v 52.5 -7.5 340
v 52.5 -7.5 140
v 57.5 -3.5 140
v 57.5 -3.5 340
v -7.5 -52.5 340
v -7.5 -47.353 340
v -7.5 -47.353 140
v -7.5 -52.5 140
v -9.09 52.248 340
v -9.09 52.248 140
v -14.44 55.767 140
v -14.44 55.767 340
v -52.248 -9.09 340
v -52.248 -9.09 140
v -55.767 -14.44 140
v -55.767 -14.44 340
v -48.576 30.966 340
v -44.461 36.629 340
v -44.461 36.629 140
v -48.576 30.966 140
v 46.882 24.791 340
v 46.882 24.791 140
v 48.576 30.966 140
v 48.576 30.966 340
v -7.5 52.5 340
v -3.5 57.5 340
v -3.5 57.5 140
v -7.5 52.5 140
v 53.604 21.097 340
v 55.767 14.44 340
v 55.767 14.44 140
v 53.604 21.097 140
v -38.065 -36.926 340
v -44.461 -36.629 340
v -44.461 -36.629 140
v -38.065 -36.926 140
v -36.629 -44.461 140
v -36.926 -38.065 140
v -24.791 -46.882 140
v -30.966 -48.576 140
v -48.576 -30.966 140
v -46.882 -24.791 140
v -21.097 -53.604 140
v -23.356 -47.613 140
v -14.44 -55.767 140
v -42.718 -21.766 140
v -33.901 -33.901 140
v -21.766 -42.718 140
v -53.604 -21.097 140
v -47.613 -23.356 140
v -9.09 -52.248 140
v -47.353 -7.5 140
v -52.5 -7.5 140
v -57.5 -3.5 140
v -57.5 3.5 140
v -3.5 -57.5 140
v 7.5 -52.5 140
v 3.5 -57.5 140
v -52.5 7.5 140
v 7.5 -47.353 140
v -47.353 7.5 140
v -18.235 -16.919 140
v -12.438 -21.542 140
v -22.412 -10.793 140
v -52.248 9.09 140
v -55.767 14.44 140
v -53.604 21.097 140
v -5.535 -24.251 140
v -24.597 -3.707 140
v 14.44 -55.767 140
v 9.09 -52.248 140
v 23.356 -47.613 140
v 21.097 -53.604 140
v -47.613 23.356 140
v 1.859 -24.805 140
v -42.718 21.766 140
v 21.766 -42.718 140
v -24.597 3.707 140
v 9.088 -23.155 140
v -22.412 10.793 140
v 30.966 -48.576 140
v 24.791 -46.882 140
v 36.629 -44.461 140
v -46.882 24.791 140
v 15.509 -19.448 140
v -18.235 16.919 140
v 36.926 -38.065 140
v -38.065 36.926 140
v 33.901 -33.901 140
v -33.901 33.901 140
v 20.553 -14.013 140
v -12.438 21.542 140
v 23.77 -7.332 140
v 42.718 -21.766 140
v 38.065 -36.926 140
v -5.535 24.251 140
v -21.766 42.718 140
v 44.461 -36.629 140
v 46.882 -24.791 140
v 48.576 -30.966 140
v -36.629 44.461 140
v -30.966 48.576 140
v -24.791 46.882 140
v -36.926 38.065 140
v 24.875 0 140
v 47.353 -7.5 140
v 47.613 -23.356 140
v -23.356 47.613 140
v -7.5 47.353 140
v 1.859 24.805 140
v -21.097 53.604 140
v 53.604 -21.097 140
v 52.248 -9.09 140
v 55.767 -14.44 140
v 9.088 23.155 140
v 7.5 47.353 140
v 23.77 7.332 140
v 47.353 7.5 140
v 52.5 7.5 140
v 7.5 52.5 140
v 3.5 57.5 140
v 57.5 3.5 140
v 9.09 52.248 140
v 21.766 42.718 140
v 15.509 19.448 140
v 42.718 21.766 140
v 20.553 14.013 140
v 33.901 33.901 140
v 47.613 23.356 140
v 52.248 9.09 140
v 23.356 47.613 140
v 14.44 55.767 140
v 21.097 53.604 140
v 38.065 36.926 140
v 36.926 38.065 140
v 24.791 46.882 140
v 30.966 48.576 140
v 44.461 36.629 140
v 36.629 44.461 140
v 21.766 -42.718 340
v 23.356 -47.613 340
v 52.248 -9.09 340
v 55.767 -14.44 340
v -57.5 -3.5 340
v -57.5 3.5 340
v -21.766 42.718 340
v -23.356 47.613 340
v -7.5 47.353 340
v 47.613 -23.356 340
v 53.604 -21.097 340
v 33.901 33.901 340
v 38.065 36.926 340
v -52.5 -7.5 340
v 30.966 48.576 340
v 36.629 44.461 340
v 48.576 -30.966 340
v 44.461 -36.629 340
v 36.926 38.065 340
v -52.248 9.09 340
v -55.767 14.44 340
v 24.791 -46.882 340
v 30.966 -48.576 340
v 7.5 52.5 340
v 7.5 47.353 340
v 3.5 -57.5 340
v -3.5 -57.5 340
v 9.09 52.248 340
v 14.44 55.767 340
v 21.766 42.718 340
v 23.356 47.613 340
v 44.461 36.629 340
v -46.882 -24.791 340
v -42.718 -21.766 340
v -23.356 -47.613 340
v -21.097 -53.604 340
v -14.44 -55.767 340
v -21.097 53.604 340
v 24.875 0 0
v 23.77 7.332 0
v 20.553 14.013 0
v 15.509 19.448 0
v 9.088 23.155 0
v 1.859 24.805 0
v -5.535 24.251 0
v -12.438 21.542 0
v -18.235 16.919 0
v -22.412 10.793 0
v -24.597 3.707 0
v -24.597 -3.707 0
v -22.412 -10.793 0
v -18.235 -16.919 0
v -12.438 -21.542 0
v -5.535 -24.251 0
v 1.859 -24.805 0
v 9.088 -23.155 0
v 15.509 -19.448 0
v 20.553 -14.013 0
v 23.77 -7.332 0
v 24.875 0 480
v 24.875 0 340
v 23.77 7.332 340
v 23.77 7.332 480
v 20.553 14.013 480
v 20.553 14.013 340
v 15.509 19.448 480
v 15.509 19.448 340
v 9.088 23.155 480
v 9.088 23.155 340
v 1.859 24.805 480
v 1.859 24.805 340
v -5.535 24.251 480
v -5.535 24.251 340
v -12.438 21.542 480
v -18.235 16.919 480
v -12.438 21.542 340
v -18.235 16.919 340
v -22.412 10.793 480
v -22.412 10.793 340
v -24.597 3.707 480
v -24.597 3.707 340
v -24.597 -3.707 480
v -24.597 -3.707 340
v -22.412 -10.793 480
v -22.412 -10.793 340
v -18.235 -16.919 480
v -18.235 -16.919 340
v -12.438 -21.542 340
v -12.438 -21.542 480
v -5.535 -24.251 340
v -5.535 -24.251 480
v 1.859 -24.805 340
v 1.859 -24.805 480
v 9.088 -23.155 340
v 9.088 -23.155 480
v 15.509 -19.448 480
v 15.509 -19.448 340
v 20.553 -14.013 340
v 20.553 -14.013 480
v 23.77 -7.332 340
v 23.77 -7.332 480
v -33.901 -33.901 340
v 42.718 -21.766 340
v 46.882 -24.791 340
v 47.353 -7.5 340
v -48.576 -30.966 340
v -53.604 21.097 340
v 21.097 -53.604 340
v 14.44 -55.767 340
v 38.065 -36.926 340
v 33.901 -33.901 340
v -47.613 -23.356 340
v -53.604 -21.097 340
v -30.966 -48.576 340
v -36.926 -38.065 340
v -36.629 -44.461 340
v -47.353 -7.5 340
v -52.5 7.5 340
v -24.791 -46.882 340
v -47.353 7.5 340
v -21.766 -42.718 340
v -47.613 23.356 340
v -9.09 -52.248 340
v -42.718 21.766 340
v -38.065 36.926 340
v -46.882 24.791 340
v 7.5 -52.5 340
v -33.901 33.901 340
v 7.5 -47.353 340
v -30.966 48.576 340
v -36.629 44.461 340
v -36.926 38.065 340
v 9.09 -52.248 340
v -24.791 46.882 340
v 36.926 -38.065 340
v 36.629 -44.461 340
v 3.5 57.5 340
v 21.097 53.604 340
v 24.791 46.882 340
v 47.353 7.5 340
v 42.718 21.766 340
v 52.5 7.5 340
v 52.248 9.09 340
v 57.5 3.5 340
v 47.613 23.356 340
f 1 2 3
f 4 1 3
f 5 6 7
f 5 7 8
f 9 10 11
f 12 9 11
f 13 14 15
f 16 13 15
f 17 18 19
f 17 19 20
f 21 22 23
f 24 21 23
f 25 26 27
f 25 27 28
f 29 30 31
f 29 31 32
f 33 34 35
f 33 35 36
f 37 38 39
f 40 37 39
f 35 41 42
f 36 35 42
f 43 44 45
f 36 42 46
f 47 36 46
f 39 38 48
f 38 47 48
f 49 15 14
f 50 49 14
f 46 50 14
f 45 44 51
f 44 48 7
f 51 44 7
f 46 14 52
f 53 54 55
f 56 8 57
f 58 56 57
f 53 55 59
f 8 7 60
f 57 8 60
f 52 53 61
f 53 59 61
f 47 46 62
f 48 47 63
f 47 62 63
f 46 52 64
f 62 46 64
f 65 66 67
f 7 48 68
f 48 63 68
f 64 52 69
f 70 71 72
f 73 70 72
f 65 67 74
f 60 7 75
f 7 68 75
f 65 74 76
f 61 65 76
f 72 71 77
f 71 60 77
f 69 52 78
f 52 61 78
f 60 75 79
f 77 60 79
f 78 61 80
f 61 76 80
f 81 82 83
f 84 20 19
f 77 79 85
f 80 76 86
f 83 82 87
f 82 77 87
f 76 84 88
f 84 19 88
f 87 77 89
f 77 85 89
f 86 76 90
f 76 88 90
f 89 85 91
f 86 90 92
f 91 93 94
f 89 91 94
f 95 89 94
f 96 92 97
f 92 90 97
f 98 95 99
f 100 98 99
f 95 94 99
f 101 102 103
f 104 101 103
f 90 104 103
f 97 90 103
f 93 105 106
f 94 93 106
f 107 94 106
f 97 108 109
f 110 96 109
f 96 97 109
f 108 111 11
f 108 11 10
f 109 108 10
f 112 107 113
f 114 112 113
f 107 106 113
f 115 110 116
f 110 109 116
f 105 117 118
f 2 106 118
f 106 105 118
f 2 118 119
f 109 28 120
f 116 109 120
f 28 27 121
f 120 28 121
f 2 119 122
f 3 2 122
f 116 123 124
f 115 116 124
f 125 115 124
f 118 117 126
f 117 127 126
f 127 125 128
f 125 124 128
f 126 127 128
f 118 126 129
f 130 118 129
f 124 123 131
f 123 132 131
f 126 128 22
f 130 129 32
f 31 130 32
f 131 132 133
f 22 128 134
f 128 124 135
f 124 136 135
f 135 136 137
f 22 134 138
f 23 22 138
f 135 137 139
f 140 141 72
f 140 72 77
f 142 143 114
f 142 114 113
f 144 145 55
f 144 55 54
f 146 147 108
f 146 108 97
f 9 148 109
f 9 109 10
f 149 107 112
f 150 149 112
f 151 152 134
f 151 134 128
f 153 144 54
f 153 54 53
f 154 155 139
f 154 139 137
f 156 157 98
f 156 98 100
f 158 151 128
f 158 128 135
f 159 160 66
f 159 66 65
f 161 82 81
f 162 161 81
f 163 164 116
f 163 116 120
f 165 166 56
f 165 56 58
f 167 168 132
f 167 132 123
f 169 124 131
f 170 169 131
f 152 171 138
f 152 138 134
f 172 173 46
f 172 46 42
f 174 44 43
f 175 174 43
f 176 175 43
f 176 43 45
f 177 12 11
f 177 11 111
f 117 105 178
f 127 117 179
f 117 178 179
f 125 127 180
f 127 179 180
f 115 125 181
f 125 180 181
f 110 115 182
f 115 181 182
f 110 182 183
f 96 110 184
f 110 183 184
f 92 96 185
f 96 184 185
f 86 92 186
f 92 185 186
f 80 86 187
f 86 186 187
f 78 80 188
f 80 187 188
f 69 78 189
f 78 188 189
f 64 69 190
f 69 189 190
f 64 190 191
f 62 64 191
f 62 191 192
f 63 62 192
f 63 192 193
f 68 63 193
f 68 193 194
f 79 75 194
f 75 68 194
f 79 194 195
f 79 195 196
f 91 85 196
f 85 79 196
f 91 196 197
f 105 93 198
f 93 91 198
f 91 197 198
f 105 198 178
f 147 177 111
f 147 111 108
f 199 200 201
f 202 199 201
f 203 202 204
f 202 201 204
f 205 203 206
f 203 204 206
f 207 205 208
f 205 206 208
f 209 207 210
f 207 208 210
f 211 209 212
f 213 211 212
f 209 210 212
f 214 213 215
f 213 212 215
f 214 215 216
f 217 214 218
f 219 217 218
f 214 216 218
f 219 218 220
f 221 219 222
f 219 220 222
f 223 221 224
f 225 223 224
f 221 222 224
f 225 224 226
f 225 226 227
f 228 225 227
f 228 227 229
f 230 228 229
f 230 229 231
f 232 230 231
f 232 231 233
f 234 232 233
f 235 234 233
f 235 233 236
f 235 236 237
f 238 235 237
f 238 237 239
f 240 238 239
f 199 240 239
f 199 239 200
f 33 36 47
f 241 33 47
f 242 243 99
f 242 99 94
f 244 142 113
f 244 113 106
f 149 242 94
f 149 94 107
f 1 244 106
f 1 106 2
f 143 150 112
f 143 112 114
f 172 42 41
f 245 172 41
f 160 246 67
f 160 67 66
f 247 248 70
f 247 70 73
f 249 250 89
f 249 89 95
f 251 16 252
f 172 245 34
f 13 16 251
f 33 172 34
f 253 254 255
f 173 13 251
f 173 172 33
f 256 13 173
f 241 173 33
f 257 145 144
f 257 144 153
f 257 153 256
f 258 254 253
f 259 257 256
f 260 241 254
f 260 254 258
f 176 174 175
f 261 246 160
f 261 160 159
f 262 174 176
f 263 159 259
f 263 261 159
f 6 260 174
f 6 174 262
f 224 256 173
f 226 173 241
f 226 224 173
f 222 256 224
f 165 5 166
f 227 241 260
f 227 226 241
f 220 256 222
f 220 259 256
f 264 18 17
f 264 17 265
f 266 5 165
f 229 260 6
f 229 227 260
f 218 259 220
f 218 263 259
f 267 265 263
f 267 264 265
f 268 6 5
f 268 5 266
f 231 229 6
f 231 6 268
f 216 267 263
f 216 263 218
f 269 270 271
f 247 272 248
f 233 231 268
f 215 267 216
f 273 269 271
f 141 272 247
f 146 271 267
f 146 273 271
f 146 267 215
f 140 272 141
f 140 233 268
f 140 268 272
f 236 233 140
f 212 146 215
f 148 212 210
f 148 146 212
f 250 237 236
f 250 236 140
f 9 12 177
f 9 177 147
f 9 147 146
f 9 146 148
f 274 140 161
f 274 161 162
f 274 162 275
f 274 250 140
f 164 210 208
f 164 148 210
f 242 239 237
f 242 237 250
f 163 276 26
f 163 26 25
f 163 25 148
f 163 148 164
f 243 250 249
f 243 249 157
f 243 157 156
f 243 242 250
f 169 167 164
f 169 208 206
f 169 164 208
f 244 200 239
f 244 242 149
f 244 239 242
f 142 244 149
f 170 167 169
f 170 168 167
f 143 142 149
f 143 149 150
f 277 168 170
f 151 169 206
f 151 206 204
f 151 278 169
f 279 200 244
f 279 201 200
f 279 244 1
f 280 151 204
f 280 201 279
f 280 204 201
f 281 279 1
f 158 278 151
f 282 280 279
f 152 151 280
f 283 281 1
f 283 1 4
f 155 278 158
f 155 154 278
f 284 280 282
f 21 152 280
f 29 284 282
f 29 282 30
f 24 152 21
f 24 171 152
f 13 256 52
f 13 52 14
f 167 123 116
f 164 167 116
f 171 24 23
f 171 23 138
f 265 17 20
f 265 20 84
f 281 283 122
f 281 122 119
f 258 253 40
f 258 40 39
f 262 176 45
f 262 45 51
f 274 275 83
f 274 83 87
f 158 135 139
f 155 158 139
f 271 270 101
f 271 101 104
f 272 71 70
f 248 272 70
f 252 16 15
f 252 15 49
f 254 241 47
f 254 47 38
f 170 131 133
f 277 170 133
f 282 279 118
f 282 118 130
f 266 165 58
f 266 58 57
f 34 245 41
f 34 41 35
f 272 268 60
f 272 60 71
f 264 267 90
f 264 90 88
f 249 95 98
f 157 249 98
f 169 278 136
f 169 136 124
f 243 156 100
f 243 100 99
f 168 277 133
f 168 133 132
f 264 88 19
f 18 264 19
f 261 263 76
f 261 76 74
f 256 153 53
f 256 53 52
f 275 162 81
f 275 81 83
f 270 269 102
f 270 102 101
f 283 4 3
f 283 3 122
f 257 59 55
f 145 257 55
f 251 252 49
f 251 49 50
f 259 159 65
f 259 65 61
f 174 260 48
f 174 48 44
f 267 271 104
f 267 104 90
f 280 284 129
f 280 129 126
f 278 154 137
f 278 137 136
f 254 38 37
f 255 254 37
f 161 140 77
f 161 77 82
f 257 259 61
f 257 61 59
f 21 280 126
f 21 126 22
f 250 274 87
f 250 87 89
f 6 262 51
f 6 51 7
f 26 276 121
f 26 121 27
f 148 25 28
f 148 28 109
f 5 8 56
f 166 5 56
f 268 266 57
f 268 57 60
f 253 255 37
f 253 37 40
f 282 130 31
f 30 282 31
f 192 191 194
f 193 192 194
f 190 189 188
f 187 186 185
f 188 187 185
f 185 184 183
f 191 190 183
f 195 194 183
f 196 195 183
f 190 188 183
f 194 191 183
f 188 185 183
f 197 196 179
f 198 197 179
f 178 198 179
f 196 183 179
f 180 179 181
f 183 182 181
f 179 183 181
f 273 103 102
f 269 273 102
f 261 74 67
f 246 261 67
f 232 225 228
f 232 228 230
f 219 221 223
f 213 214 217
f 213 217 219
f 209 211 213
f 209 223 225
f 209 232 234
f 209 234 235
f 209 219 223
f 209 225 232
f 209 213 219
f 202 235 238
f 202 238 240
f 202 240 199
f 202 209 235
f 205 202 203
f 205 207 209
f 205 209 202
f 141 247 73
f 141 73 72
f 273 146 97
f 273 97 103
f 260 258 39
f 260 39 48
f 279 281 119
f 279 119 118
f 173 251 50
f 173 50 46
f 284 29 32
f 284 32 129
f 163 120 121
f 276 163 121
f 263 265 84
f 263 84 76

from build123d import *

# Parameters (mm, degrees)
SKETCH1_R           = 24.875
BOSS_EXTRUDE1_DEPTH = 480
SKETCH4_R           = 47.5
BOSS_EXTRUDE2_DEPTH = 100
BOSS_EXTRUDE3_DEPTH = 200
CIRPATTERN1_COUNT   = 20


with BuildPart() as part:
    # Sketch1 → Boss-Extrude1 (new body)
    with BuildSketch(Plane.XY):
        Circle(SKETCH1_R)
    extrude(amount=BOSS_EXTRUDE1_DEPTH)

    # Sketch4 → Boss-Extrude2 (add, symmetric)
    with BuildSketch(Plane.XY.offset(240)):
        Circle(SKETCH4_R)
    extrude(amount=BOSS_EXTRUDE2_DEPTH, both=True)

    # Sketch5 → Boss-Extrude3 (add)
    with BuildSketch(Plane.XY.offset(340)):
        with BuildLine():
            ThreePointArc((7.5, 46.904157598), (0, 47.5), (-7.5, 46.904157598))
            Line((-7.5, 46.904157598), (-7.5, 37.5))
            Line((-7.5, 37.5), (7.5, 37.5))
            Line((7.5, 37.5), (7.5, 46.904157598))
        make_face()
        with BuildLine():
            Line((-7.5, 37.5), (-7.5, 46.904157598))
            ThreePointArc((-7.5, 46.904157598), (-30.822070015, -36.142080737), (47.5, 0))
            ThreePointArc((47.5, 0), (36.142080737, 30.822070015), (7.5, 46.904157598))
            Line((7.5, 46.904157598), (7.5, 37.5))
            Line((7.5, 37.5), (-7.5, 37.5))
        make_face()
        with BuildLine():
            Line((-3.5, 57.5), (-7.5, 52.5))
            Line((-7.5, 52.5), (-7.5, 46.904157598))
            ThreePointArc((-7.5, 46.904157598), (0, 47.5), (7.5, 46.904157598))
            Line((7.5, 46.904157598), (7.5, 52.5))
            Line((7.5, 52.5), (3.5, 57.5))
            Line((3.5, 57.5), (-3.5, 57.5))
        make_face()
    boss_extrude3 = extrude(amount=-BOSS_EXTRUDE3_DEPTH)

    # CirPattern1: Boss-Extrude3 ×20 about axis
    cirpattern1_axis = Axis((0, 0, 0), (0, 0, 1))
    for i in range(1, CIRPATTERN1_COUNT):
        add(boss_extrude3.rotate(cirpattern1_axis, i * 360 / CIRPATTERN1_COUNT))


solid = part.part
